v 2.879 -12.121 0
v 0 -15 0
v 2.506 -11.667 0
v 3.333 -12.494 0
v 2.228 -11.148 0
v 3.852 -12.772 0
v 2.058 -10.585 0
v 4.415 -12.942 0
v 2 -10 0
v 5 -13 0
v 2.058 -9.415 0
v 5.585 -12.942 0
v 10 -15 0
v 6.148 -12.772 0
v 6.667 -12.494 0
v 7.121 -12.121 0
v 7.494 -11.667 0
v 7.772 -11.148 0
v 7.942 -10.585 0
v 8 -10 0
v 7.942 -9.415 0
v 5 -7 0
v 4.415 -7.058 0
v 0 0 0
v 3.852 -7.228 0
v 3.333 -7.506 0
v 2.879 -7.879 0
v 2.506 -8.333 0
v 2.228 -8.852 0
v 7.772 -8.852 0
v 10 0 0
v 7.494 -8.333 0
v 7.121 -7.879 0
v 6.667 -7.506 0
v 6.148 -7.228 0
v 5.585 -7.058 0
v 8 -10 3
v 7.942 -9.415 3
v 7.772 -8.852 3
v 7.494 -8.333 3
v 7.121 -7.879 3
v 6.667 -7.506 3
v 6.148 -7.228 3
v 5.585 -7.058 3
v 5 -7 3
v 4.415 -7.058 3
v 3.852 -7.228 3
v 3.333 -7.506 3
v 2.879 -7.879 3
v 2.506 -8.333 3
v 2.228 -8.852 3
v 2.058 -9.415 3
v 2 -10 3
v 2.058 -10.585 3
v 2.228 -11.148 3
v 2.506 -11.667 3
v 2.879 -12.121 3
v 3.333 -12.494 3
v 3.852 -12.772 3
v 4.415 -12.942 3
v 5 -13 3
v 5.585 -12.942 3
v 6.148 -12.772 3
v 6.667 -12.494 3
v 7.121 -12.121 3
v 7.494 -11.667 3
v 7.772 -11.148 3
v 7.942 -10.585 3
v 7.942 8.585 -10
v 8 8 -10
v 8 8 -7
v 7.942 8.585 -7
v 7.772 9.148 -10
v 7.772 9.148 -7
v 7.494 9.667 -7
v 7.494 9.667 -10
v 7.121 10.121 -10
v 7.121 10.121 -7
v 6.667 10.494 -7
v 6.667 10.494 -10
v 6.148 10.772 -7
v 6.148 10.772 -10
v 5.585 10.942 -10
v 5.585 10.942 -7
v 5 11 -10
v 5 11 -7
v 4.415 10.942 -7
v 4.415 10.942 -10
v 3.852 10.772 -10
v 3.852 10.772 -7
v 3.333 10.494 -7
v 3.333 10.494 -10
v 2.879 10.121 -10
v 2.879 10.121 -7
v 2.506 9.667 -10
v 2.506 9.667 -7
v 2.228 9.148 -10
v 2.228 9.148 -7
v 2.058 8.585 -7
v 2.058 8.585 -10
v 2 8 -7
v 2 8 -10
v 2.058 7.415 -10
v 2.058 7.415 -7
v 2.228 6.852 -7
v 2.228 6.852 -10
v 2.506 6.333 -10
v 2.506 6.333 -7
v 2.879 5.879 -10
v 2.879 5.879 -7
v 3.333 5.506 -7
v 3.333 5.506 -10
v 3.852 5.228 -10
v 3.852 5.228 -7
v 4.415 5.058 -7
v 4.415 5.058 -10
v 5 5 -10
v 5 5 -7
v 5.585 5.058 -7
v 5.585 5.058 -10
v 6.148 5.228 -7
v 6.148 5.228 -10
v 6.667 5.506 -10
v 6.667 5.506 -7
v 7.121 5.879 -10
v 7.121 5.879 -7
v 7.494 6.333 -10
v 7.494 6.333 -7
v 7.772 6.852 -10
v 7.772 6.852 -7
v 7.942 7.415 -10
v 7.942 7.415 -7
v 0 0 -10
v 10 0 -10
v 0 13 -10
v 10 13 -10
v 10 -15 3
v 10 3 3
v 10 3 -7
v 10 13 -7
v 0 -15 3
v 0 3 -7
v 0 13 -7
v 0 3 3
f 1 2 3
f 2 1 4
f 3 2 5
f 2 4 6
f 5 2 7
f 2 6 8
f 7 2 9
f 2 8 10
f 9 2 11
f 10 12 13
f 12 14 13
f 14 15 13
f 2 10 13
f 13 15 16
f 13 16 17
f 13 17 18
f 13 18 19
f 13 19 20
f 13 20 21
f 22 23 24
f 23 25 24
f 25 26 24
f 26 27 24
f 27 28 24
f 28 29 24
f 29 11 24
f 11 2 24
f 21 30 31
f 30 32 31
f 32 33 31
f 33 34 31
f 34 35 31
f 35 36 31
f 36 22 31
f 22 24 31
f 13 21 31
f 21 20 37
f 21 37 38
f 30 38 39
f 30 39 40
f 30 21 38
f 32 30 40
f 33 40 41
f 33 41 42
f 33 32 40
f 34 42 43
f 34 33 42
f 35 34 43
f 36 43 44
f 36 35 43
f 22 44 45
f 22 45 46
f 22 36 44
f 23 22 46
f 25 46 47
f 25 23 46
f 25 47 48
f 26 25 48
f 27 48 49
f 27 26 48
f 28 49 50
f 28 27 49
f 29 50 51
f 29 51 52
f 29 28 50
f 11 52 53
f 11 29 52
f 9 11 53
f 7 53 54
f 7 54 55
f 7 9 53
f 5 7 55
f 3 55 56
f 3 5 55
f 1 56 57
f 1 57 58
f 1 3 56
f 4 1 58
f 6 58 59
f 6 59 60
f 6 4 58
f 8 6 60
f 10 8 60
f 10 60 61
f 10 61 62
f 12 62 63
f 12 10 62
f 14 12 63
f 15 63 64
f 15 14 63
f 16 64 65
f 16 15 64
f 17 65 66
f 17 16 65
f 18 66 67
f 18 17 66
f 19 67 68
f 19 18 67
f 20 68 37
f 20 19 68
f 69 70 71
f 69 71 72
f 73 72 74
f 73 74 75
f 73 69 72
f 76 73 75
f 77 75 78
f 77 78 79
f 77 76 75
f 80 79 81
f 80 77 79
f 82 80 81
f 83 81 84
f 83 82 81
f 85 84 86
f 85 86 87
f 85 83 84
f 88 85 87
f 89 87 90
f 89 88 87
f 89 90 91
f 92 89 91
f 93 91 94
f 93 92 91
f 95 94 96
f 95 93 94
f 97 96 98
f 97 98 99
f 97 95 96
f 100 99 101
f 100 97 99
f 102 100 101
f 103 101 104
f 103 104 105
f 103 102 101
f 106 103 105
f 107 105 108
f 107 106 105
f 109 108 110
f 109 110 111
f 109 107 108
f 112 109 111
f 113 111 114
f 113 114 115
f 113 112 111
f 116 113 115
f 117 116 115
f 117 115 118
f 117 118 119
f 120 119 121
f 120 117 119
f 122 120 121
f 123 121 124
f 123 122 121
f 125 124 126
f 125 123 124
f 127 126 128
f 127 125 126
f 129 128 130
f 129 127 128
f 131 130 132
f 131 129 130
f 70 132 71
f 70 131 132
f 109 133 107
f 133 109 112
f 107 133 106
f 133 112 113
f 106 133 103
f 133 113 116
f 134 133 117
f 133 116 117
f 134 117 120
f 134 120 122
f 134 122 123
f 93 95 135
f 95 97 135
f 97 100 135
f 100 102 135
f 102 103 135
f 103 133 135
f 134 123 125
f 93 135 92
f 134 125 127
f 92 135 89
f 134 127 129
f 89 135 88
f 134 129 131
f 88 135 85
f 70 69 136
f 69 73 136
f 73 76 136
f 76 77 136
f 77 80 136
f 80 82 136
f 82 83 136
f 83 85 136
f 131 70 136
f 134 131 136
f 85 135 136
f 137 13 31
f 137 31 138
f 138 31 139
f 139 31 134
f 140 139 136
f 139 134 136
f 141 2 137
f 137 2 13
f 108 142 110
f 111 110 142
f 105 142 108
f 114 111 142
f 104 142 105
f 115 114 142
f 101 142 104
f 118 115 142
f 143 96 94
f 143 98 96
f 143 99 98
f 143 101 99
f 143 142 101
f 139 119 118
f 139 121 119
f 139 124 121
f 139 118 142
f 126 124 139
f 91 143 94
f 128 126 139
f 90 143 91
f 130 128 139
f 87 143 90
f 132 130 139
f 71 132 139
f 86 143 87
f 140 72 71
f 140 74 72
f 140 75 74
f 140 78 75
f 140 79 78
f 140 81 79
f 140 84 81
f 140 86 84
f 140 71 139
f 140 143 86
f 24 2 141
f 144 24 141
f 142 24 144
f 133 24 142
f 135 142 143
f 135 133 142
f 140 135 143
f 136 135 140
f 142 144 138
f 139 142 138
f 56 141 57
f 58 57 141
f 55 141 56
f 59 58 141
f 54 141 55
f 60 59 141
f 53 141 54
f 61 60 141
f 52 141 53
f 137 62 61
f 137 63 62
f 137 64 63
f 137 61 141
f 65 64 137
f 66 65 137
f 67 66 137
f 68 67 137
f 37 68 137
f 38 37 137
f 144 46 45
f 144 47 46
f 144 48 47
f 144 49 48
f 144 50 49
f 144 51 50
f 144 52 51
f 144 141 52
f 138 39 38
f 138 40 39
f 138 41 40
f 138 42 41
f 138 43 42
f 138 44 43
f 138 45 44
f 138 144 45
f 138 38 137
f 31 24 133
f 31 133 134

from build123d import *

# Parameters (mm, degrees)
SKETCH1_W           = 10
SKETCH1_H           = 15
SKETCH1_R           = 3
SKETCH1_H_2         = 3
BOSS_EXTRUDE1_DEPTH = 3
SKETCH1_4_W         = 10
SKETCH1_4_H         = 3
BOSS_EXTRUDE2_DEPTH = 10
BOSS_EXTRUDE3_START = -10
SKETCH1_5_W         = 10
SKETCH1_5_H         = 10
SKETCH1_5_R         = 3
BOSS_EXTRUDE3_DEPTH = 3


with BuildPart() as part:
    # Sketch1 → Boss-Extrude1 (new body)
    # profile 1 of 2: a face of its own
    with BuildSketch(Plane.XY):
        with Locations((5, -7.5)):
            Rectangle(SKETCH1_W, SKETCH1_H)
        with Locations((5, -10)):
            Circle(SKETCH1_R, mode=Mode.SUBTRACT)
    # profile 2 of 2: a face of its own
    with BuildSketch(Plane.XY):
        with Locations((5, 1.5)):
            Rectangle(SKETCH1_W, SKETCH1_H_2)
    extrude(amount=BOSS_EXTRUDE1_DEPTH)

    # Sketch1<4> → Boss-Extrude2 (add)
    with BuildSketch(Plane.XY):
        with Locations((5, 1.5)):
            Rectangle(SKETCH1_4_W, SKETCH1_4_H)
    extrude(amount=-BOSS_EXTRUDE2_DEPTH)

    # Sketch1<5> → Boss-Extrude3 (add)
    with BuildSketch(Plane.XY.offset(BOSS_EXTRUDE3_START)):
        with Locations((5, 8)):
            Rectangle(SKETCH1_5_W, SKETCH1_5_H)
        with Locations((5, 8)):
            Circle(SKETCH1_5_R, mode=Mode.SUBTRACT)
    extrude(amount=BOSS_EXTRUDE3_DEPTH)


solid = part.part
